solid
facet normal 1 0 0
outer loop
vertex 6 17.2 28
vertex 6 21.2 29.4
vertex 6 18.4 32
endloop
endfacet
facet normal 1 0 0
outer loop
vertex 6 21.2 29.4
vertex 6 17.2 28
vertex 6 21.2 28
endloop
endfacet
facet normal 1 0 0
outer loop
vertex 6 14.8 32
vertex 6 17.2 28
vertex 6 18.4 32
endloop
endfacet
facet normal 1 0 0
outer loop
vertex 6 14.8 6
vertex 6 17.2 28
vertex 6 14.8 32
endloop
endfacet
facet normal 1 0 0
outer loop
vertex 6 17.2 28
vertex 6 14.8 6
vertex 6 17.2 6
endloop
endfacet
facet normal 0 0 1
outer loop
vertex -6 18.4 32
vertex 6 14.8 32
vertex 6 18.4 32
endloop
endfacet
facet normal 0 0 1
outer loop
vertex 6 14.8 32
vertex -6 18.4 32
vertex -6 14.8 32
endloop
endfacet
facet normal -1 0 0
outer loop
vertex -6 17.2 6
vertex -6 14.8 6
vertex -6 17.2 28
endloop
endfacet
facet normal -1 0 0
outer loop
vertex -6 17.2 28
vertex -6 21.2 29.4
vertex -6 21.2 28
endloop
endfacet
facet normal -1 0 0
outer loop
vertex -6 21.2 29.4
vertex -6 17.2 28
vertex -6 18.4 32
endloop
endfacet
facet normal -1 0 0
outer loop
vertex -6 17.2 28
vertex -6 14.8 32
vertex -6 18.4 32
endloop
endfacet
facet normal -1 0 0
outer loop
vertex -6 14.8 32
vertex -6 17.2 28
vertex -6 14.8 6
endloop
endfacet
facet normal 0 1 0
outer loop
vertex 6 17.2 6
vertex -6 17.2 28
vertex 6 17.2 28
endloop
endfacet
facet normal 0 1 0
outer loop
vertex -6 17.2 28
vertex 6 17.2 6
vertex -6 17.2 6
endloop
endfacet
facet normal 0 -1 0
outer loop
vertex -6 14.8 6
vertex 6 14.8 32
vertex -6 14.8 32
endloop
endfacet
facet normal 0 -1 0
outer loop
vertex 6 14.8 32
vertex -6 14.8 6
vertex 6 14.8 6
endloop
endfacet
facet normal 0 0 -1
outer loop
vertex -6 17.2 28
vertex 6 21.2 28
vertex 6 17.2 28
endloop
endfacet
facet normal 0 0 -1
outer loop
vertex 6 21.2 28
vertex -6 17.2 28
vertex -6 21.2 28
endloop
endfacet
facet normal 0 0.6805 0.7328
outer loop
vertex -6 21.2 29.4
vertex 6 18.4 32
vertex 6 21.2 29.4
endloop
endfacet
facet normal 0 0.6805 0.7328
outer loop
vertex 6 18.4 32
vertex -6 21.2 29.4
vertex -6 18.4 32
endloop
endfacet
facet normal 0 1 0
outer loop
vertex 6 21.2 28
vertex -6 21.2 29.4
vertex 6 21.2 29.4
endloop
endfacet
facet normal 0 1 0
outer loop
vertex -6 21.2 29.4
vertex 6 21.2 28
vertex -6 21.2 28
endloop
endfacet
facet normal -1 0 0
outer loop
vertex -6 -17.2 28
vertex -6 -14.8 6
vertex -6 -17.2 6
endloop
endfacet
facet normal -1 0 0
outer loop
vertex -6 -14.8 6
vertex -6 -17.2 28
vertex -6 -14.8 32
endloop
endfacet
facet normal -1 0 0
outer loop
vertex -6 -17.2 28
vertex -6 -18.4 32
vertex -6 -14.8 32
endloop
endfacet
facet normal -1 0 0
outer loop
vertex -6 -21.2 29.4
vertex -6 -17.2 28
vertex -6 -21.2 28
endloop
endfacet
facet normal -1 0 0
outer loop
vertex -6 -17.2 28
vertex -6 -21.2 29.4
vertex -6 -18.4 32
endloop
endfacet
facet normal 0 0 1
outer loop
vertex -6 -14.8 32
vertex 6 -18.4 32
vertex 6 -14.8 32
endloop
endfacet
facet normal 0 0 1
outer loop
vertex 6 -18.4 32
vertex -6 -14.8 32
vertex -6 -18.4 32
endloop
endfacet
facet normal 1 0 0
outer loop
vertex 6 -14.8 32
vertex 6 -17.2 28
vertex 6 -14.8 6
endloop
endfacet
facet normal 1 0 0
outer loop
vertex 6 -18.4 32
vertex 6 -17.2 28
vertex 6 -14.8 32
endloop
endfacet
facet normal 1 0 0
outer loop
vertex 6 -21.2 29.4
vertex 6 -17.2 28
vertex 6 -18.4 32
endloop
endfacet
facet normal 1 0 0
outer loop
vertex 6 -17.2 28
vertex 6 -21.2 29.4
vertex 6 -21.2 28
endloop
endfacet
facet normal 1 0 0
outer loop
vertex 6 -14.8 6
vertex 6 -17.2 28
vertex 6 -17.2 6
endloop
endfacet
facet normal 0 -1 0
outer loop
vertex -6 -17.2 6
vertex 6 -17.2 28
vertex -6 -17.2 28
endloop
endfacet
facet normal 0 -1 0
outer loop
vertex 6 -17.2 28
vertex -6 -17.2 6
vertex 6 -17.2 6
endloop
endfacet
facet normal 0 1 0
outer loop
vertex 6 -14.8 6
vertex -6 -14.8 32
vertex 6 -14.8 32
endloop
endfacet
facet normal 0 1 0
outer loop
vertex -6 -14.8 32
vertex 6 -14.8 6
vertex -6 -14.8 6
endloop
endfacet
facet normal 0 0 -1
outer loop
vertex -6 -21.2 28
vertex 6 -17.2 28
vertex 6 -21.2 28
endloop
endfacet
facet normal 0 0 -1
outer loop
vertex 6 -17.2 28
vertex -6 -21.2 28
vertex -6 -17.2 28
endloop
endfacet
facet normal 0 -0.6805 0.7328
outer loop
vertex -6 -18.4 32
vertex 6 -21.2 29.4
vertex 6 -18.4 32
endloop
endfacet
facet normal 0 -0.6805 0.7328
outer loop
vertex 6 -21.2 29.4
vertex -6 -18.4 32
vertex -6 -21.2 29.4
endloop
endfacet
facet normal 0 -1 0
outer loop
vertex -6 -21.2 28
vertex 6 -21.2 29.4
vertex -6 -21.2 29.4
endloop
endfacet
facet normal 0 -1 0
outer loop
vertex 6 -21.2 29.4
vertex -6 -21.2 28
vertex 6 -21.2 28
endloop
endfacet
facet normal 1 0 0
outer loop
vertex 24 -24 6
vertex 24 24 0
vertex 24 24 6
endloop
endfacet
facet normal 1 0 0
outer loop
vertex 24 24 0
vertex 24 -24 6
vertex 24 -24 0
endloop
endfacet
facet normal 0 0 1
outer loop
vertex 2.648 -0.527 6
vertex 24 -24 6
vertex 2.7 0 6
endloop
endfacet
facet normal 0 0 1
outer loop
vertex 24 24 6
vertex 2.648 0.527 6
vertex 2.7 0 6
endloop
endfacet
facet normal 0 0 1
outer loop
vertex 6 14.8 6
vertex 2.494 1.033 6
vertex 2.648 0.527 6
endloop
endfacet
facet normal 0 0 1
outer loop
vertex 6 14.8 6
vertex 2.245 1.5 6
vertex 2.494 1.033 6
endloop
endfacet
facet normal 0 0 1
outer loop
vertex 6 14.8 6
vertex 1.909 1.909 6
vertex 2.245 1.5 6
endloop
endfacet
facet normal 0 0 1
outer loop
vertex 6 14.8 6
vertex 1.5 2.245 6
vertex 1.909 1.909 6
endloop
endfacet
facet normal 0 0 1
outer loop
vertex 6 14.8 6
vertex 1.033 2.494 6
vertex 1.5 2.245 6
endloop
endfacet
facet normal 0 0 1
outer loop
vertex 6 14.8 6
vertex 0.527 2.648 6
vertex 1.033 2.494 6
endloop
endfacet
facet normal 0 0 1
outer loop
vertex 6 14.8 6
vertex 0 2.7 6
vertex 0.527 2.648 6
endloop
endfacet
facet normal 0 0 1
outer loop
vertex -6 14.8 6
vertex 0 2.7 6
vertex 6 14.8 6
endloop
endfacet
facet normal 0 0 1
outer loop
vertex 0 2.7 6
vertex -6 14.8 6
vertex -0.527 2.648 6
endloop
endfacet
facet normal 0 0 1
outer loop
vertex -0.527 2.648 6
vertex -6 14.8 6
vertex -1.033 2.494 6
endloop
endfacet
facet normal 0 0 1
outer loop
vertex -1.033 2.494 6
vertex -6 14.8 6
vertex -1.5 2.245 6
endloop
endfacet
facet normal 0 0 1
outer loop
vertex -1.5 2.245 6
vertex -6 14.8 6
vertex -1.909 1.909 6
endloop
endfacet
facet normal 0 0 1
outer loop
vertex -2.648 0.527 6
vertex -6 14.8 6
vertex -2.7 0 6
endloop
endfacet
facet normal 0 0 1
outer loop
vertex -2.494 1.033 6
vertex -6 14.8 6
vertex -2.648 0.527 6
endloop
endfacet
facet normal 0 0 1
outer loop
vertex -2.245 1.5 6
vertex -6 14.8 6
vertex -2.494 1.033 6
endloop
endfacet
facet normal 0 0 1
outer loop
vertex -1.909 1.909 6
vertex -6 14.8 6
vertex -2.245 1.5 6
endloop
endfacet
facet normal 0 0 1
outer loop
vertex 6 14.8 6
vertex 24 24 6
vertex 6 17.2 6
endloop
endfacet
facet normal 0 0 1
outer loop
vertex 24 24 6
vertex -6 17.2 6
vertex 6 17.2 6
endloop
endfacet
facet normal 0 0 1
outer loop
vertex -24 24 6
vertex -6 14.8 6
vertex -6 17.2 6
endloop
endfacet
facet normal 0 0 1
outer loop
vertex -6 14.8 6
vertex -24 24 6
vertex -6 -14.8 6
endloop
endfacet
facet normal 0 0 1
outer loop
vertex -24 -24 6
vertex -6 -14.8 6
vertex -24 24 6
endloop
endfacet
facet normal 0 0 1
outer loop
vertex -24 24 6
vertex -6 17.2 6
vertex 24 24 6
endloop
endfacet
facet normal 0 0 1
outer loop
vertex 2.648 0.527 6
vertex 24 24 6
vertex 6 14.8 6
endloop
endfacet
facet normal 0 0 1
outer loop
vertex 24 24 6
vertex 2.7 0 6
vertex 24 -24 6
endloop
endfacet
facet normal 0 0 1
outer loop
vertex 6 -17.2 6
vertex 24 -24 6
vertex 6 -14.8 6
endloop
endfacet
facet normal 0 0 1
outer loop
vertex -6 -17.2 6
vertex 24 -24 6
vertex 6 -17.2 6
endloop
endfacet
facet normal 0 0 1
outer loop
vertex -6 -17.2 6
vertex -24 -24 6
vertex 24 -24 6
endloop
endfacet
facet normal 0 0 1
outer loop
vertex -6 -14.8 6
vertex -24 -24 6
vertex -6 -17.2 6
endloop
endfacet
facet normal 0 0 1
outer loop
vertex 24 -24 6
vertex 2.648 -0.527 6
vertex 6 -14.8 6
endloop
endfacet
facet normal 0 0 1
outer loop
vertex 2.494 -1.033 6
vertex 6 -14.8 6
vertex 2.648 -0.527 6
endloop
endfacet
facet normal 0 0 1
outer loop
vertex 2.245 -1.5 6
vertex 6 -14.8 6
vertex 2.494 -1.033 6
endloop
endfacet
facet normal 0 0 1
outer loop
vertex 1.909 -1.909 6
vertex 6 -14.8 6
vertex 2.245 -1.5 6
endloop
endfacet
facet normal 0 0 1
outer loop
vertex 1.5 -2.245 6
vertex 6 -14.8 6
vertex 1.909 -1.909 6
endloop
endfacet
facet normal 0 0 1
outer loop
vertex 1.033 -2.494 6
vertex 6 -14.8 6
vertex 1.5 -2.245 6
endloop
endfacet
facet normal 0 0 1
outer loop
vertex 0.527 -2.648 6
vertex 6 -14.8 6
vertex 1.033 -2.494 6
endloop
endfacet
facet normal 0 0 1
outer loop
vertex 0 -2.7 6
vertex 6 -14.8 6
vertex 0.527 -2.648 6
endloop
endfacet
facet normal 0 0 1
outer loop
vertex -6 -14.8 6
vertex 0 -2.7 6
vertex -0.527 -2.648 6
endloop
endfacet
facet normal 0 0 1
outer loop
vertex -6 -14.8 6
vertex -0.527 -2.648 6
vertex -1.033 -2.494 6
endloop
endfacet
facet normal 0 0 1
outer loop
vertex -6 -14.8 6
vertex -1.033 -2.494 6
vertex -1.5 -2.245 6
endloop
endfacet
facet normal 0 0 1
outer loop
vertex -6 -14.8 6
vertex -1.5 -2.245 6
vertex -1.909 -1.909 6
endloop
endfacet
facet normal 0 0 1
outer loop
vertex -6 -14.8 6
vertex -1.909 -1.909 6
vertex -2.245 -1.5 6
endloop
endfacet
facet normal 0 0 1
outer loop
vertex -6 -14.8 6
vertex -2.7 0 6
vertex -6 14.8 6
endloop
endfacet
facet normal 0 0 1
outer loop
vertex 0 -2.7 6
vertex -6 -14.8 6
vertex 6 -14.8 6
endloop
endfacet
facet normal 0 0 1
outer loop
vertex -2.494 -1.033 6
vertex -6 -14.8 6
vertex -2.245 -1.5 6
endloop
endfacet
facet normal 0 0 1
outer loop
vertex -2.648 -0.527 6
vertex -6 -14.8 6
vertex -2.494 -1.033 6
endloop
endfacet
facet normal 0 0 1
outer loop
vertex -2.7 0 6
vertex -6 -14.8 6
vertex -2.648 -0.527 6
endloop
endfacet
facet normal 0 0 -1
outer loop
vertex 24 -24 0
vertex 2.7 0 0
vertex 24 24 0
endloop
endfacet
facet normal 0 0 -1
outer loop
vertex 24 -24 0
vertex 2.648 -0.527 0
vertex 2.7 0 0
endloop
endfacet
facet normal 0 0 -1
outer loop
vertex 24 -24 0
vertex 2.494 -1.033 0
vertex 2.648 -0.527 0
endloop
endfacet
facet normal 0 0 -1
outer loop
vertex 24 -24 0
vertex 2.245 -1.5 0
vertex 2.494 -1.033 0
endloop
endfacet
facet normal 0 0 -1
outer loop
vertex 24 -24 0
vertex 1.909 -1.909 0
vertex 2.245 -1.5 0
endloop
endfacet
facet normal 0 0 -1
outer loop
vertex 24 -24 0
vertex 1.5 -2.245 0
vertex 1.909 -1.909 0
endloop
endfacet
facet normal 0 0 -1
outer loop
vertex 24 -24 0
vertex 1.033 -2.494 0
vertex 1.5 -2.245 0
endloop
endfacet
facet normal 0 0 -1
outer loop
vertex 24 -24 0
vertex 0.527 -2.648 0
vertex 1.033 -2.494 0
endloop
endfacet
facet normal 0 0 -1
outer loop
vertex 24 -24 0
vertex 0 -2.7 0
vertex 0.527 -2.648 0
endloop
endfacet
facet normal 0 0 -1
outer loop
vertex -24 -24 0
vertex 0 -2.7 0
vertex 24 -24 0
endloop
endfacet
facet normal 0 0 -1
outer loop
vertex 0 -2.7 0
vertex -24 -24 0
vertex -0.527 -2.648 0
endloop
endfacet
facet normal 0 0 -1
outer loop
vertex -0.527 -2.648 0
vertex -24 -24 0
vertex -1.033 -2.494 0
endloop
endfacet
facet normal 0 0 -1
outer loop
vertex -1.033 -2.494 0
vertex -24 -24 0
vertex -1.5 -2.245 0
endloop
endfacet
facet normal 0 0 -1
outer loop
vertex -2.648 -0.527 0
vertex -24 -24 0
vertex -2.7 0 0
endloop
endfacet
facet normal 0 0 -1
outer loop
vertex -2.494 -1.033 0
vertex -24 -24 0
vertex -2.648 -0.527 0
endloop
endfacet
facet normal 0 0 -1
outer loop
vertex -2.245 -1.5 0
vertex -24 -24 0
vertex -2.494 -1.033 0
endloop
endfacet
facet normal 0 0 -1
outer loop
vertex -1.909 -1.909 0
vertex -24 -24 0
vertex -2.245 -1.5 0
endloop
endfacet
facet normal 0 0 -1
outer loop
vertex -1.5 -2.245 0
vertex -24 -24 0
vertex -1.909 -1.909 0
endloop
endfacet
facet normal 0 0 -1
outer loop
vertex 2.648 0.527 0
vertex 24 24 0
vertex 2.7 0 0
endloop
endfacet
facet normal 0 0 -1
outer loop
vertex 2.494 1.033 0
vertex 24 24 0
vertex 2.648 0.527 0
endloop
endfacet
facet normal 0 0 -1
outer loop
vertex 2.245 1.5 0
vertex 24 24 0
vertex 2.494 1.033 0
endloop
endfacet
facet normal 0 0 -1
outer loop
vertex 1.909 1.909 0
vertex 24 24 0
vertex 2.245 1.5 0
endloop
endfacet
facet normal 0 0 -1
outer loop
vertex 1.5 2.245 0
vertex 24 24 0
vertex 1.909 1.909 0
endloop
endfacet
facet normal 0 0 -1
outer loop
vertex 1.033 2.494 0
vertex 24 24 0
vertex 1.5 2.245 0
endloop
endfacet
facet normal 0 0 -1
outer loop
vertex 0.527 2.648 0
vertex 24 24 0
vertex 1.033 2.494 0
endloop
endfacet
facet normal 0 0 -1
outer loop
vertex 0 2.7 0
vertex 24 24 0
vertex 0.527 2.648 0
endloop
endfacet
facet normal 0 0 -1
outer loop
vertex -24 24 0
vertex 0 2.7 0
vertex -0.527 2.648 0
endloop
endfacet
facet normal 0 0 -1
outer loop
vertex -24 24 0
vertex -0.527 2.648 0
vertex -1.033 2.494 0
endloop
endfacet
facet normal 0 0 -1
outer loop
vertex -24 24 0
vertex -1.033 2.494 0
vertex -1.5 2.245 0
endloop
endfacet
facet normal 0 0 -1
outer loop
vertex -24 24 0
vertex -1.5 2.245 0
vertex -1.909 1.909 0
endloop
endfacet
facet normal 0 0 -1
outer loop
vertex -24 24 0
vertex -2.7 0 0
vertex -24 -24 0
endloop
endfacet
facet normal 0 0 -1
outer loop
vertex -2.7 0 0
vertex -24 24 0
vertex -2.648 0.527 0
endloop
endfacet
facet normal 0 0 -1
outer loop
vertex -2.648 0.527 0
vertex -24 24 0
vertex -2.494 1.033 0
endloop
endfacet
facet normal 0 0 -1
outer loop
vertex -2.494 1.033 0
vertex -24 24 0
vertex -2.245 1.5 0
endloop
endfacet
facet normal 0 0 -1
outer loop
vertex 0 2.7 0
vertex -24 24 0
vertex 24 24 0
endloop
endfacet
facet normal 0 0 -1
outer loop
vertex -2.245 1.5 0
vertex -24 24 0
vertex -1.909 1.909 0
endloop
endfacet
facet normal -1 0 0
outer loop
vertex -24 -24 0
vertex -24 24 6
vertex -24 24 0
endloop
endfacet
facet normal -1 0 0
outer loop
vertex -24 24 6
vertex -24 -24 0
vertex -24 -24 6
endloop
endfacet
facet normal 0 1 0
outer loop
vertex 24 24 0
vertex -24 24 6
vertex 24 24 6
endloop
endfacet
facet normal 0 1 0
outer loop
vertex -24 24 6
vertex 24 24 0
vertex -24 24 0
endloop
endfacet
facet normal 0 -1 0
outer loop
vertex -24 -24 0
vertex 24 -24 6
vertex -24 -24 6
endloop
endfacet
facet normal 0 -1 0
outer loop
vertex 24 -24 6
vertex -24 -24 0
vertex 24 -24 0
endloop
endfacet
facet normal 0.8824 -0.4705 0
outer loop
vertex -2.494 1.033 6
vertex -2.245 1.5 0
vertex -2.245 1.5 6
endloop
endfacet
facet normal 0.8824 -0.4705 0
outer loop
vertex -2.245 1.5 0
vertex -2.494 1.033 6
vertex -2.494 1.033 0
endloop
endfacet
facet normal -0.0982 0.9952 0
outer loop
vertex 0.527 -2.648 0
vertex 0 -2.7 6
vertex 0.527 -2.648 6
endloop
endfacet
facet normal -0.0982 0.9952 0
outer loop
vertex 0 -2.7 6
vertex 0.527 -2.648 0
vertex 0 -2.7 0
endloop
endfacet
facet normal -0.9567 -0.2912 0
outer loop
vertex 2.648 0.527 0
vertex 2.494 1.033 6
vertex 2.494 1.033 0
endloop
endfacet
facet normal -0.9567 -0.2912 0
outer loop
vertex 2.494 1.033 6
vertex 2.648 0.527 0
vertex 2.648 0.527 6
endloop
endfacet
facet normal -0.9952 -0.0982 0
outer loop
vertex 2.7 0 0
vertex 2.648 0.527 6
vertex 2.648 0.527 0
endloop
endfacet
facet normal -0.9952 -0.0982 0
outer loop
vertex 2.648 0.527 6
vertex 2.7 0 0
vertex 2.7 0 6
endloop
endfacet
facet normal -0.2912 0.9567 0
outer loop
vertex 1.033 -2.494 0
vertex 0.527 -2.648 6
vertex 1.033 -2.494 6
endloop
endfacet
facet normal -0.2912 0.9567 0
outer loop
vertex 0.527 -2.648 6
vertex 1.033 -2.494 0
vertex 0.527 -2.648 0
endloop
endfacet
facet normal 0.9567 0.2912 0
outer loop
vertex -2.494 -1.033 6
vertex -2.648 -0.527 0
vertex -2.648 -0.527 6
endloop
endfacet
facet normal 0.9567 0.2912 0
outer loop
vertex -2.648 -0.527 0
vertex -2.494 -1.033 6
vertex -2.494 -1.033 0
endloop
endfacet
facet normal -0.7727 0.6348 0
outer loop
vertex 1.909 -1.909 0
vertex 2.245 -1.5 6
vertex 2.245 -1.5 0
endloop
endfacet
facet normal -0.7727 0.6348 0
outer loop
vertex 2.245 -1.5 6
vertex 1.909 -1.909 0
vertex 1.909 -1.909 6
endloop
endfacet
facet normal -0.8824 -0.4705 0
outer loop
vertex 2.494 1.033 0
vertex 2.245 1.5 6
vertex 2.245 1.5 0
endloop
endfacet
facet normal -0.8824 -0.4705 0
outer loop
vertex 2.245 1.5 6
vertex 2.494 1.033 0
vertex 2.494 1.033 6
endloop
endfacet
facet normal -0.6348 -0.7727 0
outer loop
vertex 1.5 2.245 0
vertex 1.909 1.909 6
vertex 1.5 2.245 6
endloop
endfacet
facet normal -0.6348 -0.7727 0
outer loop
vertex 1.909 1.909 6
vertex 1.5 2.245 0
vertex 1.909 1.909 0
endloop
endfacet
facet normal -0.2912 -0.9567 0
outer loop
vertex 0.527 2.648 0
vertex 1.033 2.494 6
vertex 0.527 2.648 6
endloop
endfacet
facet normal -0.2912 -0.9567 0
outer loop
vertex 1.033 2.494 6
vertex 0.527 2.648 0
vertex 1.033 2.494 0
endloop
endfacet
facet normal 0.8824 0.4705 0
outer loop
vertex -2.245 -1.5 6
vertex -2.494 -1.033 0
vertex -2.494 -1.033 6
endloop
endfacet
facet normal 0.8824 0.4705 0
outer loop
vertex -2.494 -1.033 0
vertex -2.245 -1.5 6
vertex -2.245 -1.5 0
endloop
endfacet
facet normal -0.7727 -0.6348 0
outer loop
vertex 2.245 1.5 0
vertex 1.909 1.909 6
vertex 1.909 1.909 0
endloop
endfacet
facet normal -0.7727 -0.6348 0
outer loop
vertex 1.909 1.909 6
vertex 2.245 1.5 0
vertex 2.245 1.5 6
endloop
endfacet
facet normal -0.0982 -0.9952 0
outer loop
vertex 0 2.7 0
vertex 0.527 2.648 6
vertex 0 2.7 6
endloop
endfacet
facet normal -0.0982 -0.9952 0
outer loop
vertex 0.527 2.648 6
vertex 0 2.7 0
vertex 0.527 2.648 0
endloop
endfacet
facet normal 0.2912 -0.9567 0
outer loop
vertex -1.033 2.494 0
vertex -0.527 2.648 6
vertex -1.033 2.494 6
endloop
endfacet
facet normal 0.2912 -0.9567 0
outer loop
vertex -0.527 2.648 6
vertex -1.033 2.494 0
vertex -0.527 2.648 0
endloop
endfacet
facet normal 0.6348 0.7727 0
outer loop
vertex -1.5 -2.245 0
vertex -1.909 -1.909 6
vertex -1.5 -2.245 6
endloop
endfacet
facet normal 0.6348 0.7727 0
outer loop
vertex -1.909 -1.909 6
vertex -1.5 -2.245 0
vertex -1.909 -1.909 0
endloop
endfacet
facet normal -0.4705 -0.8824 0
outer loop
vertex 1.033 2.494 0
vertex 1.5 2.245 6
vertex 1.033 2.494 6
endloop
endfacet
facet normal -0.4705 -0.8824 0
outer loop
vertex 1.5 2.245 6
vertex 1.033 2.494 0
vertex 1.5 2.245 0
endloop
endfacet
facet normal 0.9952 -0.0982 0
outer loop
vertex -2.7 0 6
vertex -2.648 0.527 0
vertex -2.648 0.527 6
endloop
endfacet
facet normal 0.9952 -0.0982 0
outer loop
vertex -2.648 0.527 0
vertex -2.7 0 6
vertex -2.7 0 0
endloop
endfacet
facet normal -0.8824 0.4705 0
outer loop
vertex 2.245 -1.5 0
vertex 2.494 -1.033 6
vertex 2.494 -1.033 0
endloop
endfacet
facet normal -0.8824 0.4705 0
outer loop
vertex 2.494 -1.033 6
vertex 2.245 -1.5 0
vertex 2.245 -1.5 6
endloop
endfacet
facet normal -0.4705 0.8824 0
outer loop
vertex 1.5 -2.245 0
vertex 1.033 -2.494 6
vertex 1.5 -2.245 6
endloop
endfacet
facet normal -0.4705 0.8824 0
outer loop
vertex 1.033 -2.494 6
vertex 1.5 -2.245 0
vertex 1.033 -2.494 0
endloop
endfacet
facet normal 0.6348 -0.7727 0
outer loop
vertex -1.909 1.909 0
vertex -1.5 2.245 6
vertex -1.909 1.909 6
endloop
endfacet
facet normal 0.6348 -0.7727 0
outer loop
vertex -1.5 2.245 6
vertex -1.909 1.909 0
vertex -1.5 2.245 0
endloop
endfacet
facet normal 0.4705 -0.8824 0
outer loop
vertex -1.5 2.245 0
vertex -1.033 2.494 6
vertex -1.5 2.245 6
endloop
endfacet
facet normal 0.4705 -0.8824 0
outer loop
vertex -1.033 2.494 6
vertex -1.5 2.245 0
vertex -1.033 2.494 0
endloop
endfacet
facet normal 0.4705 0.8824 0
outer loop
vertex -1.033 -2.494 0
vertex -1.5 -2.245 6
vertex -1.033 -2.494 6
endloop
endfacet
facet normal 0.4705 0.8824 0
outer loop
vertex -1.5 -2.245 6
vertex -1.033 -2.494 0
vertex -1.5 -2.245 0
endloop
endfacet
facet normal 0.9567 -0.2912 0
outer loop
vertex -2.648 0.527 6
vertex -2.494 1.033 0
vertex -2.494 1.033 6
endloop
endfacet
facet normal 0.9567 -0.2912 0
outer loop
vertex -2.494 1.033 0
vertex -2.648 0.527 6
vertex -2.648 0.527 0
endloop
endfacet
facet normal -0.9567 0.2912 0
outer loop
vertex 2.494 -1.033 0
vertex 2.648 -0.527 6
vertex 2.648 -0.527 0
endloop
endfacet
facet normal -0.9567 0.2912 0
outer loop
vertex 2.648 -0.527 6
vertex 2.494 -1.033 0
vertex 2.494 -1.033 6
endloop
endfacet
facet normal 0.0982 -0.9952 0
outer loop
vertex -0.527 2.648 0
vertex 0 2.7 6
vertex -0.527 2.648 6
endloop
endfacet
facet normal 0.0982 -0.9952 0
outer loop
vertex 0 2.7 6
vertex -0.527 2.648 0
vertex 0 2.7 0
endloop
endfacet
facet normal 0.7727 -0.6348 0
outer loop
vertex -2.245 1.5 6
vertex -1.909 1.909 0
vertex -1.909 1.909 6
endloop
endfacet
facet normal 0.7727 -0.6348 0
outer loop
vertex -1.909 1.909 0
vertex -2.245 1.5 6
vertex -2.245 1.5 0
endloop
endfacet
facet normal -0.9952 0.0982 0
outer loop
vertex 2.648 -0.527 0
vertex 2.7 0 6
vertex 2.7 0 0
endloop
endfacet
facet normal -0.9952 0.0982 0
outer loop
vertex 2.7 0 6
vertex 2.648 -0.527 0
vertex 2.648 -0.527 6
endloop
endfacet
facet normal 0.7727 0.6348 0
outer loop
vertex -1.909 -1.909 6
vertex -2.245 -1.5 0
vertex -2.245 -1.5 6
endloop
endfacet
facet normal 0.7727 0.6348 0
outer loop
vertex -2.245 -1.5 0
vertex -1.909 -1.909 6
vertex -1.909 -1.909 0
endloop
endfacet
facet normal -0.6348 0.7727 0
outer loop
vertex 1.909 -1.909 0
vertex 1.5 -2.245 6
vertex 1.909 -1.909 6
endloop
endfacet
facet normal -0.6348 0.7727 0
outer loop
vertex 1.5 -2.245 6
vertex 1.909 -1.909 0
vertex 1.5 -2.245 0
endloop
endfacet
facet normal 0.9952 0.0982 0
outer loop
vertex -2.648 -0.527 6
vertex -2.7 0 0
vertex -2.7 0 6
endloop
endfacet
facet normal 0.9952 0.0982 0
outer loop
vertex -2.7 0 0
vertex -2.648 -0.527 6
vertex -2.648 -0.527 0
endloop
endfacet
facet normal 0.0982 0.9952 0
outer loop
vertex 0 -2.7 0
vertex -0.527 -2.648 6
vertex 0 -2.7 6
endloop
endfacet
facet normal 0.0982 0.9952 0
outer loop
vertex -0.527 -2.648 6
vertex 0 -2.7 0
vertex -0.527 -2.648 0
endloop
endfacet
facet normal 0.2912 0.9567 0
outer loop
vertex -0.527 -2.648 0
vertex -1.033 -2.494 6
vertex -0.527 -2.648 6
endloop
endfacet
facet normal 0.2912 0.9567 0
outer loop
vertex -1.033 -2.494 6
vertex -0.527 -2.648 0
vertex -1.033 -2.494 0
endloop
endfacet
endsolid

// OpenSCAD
$fn = 32;

// ----------------------------------------------------------------------
// Snap-fit latch: 2 arms, 26 mm tall, 4.2 mm undercut hooks
// ----------------------------------------------------------------------

// --- parameters (mm) ---
base_d = 48;              // base plate depth
base_h = 6;               // base plate thickness
span = 32;                // distance between opposite arms
arm_t = 2.4;              // arm thickness
arm_d = 12;               // arm width
height = 26;              // free arm length
head_len = 4.2;           // hook reach
head_h = 4;               // hook height
lead = 1.4;               // lead-in ramp thickness
bore_d = 5.4;             // base fixing bore
top_z = 32;               // height of the arm tips above the base

arms = 2;

difference() {
  union() {
    /* base plate, centred on the arm ring */
    translate([-24, -24, 0]) cube([base_d, base_d, base_h]);
    for (a = [0 : 360 / arms : 359]) rotate([0, 0, a]) {
    /* arm, sunk 0.5 mm into the base */
    translate([-arm_d / 2, span / 2 - arm_t / 2, base_h - 0.5]) cube([arm_d, arm_t, height + 0.5]);
    /* hook: a convex hull of a tall inner block and a thin outer lip
       gives a flat undercut below and a lead-in ramp on top */
    hull() {
      translate([-arm_d / 2, span / 2 + arm_t / 2 - 0.6, top_z - head_h]) cube([arm_d, lead + 0.4, head_h]);
      translate([-arm_d / 2, span / 2 + arm_t / 2 - 0.2, top_z - head_h]) cube([arm_d, head_len, lead]);
    }
    }
  }
  translate([0, 0, -2.5]) cylinder(h = base_h + 5, d = bore_d);
}
